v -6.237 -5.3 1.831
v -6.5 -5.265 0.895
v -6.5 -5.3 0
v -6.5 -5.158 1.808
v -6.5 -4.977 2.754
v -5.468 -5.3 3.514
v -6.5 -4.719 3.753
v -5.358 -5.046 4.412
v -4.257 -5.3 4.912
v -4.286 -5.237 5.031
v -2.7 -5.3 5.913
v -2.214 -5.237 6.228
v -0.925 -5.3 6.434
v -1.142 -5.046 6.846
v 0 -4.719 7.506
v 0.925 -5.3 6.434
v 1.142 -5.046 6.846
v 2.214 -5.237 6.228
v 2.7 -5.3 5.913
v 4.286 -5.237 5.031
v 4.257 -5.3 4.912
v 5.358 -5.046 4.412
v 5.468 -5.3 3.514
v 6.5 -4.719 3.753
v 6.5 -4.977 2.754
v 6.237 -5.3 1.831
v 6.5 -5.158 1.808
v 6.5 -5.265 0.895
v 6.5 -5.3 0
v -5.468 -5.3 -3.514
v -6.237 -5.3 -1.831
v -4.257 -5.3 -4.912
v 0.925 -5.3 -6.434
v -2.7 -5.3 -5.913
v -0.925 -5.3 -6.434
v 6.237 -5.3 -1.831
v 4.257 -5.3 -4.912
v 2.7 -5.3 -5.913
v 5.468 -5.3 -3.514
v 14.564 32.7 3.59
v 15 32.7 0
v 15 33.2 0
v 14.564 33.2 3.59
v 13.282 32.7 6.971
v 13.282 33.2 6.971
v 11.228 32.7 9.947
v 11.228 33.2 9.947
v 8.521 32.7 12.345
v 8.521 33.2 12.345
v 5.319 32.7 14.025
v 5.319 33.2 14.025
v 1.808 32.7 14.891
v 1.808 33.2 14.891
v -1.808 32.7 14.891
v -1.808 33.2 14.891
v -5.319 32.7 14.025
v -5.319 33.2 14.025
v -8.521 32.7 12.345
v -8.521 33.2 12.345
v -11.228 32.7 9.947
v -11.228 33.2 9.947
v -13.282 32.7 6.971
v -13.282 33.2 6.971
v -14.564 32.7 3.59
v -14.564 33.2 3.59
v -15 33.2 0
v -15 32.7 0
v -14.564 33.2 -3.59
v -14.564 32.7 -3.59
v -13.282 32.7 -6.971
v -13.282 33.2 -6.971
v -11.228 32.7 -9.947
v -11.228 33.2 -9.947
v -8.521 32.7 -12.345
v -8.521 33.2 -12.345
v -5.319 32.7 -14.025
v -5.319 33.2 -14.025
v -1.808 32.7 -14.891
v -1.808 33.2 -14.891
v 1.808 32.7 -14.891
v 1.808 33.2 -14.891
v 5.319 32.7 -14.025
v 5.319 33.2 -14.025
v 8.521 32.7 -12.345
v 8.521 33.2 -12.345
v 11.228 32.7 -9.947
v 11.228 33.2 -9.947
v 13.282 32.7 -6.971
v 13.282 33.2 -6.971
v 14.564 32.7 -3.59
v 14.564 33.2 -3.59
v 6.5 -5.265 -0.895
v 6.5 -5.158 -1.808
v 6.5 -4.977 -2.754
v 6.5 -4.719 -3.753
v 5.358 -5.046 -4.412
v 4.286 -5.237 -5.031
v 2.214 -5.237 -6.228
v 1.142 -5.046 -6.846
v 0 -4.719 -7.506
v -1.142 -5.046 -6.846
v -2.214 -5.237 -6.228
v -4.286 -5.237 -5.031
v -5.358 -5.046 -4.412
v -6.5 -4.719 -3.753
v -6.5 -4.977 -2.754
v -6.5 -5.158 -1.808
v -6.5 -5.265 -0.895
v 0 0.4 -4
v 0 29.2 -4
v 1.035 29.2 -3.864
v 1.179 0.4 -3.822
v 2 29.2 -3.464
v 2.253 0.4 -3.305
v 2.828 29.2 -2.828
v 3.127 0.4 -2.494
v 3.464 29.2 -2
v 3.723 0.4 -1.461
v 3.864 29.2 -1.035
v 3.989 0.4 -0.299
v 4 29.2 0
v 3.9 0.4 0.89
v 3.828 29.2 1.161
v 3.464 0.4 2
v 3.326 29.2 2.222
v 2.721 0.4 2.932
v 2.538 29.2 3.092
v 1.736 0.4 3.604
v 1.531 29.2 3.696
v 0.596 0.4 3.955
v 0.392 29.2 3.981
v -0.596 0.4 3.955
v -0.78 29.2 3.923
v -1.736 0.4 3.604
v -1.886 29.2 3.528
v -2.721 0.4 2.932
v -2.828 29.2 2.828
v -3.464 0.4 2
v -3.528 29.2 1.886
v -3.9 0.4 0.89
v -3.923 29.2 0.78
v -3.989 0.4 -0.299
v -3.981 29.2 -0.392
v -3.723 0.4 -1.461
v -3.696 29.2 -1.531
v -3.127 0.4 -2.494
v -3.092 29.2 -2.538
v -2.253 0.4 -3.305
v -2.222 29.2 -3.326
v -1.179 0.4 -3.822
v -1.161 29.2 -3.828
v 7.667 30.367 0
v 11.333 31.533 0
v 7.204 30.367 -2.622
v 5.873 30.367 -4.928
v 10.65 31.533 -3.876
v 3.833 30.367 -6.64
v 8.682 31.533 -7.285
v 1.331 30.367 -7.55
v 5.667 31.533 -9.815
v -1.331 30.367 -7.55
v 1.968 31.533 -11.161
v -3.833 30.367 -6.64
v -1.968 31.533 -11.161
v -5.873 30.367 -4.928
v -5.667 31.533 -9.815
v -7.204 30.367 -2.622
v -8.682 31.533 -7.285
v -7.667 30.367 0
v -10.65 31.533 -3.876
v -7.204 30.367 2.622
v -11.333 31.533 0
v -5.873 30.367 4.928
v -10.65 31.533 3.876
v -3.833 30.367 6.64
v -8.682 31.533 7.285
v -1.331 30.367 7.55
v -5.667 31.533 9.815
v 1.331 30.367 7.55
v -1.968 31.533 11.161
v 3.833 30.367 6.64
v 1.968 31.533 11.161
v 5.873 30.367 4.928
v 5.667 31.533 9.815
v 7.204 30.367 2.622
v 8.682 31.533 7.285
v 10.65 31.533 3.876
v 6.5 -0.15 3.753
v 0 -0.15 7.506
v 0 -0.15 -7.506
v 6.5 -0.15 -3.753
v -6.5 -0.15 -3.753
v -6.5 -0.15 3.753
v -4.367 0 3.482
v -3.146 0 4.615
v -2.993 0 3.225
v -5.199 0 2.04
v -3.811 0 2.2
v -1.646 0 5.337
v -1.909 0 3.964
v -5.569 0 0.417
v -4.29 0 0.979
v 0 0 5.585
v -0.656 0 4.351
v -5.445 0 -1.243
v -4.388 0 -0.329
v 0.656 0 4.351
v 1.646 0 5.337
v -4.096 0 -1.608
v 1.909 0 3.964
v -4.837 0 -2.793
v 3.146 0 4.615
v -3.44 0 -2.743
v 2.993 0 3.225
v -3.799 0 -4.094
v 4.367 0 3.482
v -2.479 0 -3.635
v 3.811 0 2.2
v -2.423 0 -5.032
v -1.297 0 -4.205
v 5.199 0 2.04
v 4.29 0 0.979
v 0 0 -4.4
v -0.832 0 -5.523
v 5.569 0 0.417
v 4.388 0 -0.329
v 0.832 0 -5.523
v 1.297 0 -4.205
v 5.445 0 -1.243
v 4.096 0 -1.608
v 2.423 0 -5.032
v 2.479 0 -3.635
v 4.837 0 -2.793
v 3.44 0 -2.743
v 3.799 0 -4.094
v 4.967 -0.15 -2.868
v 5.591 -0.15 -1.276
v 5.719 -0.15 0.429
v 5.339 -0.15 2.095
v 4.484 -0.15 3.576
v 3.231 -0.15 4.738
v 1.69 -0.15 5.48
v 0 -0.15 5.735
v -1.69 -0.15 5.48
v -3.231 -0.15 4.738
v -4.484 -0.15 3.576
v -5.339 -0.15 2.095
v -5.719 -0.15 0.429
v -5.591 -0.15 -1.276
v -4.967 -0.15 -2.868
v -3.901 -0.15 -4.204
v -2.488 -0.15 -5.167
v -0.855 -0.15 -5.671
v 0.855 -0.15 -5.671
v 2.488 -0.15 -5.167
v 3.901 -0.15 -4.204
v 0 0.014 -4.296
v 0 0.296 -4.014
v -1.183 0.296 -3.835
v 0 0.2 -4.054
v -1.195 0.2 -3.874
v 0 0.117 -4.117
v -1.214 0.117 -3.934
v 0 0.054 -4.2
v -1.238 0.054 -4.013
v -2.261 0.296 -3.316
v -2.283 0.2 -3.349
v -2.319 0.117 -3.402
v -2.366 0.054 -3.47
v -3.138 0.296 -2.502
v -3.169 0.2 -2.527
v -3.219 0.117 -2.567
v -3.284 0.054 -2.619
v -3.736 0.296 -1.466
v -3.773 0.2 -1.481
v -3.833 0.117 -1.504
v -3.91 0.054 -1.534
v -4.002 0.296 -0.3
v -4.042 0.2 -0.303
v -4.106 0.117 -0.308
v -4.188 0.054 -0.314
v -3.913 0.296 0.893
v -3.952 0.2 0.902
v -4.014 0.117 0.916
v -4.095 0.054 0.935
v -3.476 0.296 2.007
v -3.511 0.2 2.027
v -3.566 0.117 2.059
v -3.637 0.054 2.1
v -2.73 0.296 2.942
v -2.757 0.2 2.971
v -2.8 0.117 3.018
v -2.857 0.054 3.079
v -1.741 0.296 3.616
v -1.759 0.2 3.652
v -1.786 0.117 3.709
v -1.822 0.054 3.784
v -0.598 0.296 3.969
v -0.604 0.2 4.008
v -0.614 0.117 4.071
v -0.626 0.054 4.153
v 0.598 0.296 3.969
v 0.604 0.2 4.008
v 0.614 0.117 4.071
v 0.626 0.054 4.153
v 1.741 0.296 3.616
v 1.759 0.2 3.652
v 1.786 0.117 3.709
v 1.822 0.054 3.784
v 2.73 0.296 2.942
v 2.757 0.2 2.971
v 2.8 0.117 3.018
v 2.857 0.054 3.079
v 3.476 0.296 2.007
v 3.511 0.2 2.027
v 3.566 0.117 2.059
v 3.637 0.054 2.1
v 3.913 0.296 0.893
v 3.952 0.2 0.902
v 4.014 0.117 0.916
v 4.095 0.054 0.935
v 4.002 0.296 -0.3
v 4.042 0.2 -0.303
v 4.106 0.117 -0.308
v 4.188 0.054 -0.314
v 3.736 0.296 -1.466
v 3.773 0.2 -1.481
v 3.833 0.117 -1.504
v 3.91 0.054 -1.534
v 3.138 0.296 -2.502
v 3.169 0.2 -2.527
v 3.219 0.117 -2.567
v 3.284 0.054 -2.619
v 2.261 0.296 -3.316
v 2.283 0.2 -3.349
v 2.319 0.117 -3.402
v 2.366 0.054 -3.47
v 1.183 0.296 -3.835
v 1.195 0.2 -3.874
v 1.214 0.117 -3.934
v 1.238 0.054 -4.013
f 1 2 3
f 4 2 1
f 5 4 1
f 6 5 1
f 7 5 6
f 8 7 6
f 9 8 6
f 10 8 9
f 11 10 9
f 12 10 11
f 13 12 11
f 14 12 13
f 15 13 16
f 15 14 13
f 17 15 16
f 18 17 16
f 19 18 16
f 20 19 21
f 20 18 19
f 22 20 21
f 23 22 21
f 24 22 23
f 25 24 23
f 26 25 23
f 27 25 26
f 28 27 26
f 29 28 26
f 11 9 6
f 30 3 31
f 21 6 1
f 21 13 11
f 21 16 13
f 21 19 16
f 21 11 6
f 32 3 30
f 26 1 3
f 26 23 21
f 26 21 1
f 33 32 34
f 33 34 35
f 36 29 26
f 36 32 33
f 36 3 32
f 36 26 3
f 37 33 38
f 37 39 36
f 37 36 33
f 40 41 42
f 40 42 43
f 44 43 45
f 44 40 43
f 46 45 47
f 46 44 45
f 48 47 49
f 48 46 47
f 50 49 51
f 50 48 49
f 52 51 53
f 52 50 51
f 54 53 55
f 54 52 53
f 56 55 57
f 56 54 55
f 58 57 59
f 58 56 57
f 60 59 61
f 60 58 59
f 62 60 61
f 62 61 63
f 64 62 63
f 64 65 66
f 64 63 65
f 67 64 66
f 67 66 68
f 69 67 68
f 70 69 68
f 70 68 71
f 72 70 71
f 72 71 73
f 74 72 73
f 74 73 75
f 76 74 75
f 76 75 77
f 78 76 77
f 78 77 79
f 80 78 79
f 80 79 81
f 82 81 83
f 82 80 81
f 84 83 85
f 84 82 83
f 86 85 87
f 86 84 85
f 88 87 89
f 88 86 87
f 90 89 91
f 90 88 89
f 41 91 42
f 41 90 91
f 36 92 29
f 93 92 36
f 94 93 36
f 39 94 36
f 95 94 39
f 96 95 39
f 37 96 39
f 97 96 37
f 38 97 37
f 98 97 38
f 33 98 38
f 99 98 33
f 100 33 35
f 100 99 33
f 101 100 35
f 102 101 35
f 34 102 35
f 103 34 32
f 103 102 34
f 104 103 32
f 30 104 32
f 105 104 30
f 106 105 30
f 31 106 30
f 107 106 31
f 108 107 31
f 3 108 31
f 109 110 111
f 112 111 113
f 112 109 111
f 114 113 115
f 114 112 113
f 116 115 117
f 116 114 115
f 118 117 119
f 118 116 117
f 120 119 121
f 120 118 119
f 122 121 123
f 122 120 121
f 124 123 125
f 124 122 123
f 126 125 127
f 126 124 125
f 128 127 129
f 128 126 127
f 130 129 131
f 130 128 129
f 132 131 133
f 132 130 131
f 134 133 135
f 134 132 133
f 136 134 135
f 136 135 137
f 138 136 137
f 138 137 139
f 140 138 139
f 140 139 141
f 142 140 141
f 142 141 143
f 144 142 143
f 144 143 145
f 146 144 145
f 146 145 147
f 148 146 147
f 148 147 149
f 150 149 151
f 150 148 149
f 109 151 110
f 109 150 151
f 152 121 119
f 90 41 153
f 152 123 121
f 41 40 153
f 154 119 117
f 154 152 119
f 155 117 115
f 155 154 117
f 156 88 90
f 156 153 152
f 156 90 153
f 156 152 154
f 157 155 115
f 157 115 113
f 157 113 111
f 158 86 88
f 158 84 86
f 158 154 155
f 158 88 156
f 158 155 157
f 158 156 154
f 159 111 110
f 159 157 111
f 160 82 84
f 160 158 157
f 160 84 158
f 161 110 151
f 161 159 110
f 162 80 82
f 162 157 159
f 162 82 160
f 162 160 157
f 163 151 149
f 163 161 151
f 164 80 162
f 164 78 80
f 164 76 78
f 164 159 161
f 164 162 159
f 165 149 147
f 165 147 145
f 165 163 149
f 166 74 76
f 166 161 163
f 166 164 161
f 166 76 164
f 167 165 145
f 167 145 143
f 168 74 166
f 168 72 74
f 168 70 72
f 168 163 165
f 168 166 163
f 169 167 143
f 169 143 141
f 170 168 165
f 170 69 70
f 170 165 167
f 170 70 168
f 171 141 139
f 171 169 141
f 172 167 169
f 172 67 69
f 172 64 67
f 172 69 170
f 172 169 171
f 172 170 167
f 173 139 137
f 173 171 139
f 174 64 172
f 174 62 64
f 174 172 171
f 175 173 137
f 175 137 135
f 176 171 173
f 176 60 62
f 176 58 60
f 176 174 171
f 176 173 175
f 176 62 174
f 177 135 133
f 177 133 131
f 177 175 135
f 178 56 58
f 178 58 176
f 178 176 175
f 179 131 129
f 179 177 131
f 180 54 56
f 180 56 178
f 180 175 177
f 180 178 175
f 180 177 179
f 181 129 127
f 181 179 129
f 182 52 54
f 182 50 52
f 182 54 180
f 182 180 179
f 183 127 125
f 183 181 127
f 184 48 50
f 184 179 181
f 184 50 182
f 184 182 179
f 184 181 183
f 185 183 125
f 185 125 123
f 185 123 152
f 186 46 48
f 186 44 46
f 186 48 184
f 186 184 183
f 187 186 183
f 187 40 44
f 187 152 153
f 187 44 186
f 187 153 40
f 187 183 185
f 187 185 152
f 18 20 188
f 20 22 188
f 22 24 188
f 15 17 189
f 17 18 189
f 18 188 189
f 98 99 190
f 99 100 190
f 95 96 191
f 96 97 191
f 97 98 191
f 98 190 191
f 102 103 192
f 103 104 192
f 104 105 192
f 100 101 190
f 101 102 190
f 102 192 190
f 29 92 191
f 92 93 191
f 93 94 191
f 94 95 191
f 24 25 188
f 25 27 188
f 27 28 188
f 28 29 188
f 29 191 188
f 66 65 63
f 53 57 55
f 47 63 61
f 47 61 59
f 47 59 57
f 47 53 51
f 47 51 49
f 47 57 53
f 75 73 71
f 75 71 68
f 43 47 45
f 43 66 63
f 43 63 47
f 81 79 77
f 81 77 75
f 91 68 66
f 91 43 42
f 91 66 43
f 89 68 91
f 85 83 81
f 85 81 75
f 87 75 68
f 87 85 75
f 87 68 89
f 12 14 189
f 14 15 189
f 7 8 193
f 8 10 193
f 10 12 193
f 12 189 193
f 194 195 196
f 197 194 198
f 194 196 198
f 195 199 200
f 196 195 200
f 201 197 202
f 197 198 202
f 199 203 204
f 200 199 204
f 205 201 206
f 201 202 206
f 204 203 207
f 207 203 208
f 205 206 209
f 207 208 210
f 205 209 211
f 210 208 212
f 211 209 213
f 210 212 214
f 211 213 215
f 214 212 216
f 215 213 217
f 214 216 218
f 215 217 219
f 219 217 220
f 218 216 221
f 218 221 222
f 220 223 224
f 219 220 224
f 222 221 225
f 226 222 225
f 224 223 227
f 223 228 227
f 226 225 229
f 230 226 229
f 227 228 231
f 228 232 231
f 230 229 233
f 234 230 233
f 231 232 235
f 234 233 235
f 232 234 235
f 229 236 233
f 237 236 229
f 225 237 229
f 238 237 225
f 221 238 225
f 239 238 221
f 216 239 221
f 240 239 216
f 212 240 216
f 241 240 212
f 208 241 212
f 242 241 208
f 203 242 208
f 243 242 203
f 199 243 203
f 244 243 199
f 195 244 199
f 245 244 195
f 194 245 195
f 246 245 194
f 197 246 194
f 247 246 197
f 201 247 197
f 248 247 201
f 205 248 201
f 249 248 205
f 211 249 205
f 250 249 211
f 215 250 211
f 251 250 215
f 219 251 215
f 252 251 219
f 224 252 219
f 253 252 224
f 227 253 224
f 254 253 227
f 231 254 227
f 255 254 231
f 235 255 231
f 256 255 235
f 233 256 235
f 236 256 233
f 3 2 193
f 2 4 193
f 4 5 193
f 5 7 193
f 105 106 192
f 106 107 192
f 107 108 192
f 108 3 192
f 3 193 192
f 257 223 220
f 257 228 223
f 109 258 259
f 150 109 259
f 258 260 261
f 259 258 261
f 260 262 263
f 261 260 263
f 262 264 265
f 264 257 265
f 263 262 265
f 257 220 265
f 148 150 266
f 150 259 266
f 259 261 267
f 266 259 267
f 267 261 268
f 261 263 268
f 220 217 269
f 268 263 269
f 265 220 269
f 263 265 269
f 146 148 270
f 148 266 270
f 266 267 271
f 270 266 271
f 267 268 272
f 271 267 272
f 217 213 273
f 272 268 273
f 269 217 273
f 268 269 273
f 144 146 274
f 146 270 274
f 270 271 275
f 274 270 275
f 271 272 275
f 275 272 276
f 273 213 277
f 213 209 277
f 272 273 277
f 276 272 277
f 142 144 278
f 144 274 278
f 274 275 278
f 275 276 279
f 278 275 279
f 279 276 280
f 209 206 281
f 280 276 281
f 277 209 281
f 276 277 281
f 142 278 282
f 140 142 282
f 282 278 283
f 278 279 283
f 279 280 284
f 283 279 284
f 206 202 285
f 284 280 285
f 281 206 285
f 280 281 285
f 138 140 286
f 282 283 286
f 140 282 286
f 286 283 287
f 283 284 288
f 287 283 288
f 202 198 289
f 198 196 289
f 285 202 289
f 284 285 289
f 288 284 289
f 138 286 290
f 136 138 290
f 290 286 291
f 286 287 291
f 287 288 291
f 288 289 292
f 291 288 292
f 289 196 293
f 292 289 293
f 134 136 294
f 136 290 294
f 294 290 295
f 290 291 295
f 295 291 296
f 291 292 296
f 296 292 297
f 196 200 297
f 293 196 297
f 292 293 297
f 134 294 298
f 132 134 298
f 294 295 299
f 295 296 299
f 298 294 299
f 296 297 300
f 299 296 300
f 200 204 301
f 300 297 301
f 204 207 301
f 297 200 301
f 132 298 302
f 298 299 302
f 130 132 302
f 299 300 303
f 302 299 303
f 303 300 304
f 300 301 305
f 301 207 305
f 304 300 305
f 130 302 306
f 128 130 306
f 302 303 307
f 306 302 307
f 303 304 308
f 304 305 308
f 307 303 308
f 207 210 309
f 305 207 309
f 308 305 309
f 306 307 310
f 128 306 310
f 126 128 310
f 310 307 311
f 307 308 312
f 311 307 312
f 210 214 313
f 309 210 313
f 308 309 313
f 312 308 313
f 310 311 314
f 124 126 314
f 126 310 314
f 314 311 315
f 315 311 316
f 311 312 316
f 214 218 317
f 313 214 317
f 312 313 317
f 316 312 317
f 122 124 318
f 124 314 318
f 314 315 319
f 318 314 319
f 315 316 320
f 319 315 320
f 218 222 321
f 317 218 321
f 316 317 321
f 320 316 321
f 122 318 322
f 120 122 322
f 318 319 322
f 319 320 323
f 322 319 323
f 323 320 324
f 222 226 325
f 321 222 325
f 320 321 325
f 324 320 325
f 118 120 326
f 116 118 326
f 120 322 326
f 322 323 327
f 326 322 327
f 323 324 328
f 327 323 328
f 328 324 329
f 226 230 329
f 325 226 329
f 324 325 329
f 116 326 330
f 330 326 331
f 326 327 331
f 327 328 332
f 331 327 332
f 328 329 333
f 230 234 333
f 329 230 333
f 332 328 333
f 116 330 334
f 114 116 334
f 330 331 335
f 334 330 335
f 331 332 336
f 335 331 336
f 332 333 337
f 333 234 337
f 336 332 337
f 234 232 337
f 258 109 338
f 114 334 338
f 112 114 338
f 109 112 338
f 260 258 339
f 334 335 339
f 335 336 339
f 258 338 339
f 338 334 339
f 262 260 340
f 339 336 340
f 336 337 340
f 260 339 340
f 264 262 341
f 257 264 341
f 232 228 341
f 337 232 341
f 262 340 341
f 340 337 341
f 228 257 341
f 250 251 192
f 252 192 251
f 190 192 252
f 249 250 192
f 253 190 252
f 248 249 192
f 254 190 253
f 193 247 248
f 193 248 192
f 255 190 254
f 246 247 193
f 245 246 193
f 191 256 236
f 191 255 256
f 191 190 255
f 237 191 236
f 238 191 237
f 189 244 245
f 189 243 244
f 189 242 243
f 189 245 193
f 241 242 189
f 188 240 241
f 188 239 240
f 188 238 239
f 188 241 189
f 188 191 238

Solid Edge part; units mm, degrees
sketch "Sketch1" plane through (0, 0, 0) normal (0, -1, 0) x (1, 0, 0)
  line L0 (6.5, -3.7528) -> (6.5, 3.7528)
  line L1 (6.5, 3.7528) -> (0, 7.5056)
  line L2 (0, 7.5056) -> (-6.5, 3.7528)
  line L3 (-6.5, 3.7528) -> (-6.5, -3.7528)
  line L4 (-6.5, -3.7528) -> (0, -7.5056)
  line L5 (0, -7.5056) -> (6.5, -3.7528)
extrude "Protrusion1" add sketch "Sketch1" along normal blind 5.3
sketch "Sketch2" plane through (0, 0, 0) normal (1, 0, 0) x (0, 1, 0)
  line L0 (-5.3, 6.5) -> (-4.7194, 7.5056)
revolve "RevolvedCutout1" cut sketch "Sketch2" angle 360 about axis through (0, 0, 0) along (0, -1, 0) material side at (0, -5.053, 7.0278)
sketch "Sketch3" plane through (0, 0, 0) normal (0, 1, 0) x (0.866, 0, -0.5)
  circle A0 centre (0, 0) radius 5.735
extrude "拉伸除料_1" cut sketch "Sketch3" against normal blind 0.15 flip side to cut
sketch "Sketch4" plane through (0, 0, 0) normal (0, 1, 0) x (0, 0, -1)
  circle A0 centre (0, 0) radius 4
  dimension "D1" = 8
extrude "拉伸_2" add sketch "Sketch4" along normal blind 30
chamfer "倒斜角_1" distance 0.8 angle 45 1 edges at (0, 30, 4)
fillet "倒圆_1" radius 0.4 1 edges at (0, 0, 4)
chamfer "倒斜角_2" distance 0.15 angle 45 1 edges at (-4.9667, 0, 2.8675)
cosmetic_thread "Thread1" size "M8"
sketch "Sketch5" plane through (0, 0, 0) normal (0, 0, 1) x (1, 0, 0)
  line L0 (0, 33.2) -> (15, 33.2)
  line L1 (15, 33.2) -> (15, 32.7)
  line L2 (15, 32.7) -> (4, 29.2)
  line L3 (4, 29.2) -> (0, 29.2)
revolve "RevolvedProtrusion1" add sketch "Sketch5" angle 360 about axis through (0, 29.2, 0) along (0, 1, 0)
